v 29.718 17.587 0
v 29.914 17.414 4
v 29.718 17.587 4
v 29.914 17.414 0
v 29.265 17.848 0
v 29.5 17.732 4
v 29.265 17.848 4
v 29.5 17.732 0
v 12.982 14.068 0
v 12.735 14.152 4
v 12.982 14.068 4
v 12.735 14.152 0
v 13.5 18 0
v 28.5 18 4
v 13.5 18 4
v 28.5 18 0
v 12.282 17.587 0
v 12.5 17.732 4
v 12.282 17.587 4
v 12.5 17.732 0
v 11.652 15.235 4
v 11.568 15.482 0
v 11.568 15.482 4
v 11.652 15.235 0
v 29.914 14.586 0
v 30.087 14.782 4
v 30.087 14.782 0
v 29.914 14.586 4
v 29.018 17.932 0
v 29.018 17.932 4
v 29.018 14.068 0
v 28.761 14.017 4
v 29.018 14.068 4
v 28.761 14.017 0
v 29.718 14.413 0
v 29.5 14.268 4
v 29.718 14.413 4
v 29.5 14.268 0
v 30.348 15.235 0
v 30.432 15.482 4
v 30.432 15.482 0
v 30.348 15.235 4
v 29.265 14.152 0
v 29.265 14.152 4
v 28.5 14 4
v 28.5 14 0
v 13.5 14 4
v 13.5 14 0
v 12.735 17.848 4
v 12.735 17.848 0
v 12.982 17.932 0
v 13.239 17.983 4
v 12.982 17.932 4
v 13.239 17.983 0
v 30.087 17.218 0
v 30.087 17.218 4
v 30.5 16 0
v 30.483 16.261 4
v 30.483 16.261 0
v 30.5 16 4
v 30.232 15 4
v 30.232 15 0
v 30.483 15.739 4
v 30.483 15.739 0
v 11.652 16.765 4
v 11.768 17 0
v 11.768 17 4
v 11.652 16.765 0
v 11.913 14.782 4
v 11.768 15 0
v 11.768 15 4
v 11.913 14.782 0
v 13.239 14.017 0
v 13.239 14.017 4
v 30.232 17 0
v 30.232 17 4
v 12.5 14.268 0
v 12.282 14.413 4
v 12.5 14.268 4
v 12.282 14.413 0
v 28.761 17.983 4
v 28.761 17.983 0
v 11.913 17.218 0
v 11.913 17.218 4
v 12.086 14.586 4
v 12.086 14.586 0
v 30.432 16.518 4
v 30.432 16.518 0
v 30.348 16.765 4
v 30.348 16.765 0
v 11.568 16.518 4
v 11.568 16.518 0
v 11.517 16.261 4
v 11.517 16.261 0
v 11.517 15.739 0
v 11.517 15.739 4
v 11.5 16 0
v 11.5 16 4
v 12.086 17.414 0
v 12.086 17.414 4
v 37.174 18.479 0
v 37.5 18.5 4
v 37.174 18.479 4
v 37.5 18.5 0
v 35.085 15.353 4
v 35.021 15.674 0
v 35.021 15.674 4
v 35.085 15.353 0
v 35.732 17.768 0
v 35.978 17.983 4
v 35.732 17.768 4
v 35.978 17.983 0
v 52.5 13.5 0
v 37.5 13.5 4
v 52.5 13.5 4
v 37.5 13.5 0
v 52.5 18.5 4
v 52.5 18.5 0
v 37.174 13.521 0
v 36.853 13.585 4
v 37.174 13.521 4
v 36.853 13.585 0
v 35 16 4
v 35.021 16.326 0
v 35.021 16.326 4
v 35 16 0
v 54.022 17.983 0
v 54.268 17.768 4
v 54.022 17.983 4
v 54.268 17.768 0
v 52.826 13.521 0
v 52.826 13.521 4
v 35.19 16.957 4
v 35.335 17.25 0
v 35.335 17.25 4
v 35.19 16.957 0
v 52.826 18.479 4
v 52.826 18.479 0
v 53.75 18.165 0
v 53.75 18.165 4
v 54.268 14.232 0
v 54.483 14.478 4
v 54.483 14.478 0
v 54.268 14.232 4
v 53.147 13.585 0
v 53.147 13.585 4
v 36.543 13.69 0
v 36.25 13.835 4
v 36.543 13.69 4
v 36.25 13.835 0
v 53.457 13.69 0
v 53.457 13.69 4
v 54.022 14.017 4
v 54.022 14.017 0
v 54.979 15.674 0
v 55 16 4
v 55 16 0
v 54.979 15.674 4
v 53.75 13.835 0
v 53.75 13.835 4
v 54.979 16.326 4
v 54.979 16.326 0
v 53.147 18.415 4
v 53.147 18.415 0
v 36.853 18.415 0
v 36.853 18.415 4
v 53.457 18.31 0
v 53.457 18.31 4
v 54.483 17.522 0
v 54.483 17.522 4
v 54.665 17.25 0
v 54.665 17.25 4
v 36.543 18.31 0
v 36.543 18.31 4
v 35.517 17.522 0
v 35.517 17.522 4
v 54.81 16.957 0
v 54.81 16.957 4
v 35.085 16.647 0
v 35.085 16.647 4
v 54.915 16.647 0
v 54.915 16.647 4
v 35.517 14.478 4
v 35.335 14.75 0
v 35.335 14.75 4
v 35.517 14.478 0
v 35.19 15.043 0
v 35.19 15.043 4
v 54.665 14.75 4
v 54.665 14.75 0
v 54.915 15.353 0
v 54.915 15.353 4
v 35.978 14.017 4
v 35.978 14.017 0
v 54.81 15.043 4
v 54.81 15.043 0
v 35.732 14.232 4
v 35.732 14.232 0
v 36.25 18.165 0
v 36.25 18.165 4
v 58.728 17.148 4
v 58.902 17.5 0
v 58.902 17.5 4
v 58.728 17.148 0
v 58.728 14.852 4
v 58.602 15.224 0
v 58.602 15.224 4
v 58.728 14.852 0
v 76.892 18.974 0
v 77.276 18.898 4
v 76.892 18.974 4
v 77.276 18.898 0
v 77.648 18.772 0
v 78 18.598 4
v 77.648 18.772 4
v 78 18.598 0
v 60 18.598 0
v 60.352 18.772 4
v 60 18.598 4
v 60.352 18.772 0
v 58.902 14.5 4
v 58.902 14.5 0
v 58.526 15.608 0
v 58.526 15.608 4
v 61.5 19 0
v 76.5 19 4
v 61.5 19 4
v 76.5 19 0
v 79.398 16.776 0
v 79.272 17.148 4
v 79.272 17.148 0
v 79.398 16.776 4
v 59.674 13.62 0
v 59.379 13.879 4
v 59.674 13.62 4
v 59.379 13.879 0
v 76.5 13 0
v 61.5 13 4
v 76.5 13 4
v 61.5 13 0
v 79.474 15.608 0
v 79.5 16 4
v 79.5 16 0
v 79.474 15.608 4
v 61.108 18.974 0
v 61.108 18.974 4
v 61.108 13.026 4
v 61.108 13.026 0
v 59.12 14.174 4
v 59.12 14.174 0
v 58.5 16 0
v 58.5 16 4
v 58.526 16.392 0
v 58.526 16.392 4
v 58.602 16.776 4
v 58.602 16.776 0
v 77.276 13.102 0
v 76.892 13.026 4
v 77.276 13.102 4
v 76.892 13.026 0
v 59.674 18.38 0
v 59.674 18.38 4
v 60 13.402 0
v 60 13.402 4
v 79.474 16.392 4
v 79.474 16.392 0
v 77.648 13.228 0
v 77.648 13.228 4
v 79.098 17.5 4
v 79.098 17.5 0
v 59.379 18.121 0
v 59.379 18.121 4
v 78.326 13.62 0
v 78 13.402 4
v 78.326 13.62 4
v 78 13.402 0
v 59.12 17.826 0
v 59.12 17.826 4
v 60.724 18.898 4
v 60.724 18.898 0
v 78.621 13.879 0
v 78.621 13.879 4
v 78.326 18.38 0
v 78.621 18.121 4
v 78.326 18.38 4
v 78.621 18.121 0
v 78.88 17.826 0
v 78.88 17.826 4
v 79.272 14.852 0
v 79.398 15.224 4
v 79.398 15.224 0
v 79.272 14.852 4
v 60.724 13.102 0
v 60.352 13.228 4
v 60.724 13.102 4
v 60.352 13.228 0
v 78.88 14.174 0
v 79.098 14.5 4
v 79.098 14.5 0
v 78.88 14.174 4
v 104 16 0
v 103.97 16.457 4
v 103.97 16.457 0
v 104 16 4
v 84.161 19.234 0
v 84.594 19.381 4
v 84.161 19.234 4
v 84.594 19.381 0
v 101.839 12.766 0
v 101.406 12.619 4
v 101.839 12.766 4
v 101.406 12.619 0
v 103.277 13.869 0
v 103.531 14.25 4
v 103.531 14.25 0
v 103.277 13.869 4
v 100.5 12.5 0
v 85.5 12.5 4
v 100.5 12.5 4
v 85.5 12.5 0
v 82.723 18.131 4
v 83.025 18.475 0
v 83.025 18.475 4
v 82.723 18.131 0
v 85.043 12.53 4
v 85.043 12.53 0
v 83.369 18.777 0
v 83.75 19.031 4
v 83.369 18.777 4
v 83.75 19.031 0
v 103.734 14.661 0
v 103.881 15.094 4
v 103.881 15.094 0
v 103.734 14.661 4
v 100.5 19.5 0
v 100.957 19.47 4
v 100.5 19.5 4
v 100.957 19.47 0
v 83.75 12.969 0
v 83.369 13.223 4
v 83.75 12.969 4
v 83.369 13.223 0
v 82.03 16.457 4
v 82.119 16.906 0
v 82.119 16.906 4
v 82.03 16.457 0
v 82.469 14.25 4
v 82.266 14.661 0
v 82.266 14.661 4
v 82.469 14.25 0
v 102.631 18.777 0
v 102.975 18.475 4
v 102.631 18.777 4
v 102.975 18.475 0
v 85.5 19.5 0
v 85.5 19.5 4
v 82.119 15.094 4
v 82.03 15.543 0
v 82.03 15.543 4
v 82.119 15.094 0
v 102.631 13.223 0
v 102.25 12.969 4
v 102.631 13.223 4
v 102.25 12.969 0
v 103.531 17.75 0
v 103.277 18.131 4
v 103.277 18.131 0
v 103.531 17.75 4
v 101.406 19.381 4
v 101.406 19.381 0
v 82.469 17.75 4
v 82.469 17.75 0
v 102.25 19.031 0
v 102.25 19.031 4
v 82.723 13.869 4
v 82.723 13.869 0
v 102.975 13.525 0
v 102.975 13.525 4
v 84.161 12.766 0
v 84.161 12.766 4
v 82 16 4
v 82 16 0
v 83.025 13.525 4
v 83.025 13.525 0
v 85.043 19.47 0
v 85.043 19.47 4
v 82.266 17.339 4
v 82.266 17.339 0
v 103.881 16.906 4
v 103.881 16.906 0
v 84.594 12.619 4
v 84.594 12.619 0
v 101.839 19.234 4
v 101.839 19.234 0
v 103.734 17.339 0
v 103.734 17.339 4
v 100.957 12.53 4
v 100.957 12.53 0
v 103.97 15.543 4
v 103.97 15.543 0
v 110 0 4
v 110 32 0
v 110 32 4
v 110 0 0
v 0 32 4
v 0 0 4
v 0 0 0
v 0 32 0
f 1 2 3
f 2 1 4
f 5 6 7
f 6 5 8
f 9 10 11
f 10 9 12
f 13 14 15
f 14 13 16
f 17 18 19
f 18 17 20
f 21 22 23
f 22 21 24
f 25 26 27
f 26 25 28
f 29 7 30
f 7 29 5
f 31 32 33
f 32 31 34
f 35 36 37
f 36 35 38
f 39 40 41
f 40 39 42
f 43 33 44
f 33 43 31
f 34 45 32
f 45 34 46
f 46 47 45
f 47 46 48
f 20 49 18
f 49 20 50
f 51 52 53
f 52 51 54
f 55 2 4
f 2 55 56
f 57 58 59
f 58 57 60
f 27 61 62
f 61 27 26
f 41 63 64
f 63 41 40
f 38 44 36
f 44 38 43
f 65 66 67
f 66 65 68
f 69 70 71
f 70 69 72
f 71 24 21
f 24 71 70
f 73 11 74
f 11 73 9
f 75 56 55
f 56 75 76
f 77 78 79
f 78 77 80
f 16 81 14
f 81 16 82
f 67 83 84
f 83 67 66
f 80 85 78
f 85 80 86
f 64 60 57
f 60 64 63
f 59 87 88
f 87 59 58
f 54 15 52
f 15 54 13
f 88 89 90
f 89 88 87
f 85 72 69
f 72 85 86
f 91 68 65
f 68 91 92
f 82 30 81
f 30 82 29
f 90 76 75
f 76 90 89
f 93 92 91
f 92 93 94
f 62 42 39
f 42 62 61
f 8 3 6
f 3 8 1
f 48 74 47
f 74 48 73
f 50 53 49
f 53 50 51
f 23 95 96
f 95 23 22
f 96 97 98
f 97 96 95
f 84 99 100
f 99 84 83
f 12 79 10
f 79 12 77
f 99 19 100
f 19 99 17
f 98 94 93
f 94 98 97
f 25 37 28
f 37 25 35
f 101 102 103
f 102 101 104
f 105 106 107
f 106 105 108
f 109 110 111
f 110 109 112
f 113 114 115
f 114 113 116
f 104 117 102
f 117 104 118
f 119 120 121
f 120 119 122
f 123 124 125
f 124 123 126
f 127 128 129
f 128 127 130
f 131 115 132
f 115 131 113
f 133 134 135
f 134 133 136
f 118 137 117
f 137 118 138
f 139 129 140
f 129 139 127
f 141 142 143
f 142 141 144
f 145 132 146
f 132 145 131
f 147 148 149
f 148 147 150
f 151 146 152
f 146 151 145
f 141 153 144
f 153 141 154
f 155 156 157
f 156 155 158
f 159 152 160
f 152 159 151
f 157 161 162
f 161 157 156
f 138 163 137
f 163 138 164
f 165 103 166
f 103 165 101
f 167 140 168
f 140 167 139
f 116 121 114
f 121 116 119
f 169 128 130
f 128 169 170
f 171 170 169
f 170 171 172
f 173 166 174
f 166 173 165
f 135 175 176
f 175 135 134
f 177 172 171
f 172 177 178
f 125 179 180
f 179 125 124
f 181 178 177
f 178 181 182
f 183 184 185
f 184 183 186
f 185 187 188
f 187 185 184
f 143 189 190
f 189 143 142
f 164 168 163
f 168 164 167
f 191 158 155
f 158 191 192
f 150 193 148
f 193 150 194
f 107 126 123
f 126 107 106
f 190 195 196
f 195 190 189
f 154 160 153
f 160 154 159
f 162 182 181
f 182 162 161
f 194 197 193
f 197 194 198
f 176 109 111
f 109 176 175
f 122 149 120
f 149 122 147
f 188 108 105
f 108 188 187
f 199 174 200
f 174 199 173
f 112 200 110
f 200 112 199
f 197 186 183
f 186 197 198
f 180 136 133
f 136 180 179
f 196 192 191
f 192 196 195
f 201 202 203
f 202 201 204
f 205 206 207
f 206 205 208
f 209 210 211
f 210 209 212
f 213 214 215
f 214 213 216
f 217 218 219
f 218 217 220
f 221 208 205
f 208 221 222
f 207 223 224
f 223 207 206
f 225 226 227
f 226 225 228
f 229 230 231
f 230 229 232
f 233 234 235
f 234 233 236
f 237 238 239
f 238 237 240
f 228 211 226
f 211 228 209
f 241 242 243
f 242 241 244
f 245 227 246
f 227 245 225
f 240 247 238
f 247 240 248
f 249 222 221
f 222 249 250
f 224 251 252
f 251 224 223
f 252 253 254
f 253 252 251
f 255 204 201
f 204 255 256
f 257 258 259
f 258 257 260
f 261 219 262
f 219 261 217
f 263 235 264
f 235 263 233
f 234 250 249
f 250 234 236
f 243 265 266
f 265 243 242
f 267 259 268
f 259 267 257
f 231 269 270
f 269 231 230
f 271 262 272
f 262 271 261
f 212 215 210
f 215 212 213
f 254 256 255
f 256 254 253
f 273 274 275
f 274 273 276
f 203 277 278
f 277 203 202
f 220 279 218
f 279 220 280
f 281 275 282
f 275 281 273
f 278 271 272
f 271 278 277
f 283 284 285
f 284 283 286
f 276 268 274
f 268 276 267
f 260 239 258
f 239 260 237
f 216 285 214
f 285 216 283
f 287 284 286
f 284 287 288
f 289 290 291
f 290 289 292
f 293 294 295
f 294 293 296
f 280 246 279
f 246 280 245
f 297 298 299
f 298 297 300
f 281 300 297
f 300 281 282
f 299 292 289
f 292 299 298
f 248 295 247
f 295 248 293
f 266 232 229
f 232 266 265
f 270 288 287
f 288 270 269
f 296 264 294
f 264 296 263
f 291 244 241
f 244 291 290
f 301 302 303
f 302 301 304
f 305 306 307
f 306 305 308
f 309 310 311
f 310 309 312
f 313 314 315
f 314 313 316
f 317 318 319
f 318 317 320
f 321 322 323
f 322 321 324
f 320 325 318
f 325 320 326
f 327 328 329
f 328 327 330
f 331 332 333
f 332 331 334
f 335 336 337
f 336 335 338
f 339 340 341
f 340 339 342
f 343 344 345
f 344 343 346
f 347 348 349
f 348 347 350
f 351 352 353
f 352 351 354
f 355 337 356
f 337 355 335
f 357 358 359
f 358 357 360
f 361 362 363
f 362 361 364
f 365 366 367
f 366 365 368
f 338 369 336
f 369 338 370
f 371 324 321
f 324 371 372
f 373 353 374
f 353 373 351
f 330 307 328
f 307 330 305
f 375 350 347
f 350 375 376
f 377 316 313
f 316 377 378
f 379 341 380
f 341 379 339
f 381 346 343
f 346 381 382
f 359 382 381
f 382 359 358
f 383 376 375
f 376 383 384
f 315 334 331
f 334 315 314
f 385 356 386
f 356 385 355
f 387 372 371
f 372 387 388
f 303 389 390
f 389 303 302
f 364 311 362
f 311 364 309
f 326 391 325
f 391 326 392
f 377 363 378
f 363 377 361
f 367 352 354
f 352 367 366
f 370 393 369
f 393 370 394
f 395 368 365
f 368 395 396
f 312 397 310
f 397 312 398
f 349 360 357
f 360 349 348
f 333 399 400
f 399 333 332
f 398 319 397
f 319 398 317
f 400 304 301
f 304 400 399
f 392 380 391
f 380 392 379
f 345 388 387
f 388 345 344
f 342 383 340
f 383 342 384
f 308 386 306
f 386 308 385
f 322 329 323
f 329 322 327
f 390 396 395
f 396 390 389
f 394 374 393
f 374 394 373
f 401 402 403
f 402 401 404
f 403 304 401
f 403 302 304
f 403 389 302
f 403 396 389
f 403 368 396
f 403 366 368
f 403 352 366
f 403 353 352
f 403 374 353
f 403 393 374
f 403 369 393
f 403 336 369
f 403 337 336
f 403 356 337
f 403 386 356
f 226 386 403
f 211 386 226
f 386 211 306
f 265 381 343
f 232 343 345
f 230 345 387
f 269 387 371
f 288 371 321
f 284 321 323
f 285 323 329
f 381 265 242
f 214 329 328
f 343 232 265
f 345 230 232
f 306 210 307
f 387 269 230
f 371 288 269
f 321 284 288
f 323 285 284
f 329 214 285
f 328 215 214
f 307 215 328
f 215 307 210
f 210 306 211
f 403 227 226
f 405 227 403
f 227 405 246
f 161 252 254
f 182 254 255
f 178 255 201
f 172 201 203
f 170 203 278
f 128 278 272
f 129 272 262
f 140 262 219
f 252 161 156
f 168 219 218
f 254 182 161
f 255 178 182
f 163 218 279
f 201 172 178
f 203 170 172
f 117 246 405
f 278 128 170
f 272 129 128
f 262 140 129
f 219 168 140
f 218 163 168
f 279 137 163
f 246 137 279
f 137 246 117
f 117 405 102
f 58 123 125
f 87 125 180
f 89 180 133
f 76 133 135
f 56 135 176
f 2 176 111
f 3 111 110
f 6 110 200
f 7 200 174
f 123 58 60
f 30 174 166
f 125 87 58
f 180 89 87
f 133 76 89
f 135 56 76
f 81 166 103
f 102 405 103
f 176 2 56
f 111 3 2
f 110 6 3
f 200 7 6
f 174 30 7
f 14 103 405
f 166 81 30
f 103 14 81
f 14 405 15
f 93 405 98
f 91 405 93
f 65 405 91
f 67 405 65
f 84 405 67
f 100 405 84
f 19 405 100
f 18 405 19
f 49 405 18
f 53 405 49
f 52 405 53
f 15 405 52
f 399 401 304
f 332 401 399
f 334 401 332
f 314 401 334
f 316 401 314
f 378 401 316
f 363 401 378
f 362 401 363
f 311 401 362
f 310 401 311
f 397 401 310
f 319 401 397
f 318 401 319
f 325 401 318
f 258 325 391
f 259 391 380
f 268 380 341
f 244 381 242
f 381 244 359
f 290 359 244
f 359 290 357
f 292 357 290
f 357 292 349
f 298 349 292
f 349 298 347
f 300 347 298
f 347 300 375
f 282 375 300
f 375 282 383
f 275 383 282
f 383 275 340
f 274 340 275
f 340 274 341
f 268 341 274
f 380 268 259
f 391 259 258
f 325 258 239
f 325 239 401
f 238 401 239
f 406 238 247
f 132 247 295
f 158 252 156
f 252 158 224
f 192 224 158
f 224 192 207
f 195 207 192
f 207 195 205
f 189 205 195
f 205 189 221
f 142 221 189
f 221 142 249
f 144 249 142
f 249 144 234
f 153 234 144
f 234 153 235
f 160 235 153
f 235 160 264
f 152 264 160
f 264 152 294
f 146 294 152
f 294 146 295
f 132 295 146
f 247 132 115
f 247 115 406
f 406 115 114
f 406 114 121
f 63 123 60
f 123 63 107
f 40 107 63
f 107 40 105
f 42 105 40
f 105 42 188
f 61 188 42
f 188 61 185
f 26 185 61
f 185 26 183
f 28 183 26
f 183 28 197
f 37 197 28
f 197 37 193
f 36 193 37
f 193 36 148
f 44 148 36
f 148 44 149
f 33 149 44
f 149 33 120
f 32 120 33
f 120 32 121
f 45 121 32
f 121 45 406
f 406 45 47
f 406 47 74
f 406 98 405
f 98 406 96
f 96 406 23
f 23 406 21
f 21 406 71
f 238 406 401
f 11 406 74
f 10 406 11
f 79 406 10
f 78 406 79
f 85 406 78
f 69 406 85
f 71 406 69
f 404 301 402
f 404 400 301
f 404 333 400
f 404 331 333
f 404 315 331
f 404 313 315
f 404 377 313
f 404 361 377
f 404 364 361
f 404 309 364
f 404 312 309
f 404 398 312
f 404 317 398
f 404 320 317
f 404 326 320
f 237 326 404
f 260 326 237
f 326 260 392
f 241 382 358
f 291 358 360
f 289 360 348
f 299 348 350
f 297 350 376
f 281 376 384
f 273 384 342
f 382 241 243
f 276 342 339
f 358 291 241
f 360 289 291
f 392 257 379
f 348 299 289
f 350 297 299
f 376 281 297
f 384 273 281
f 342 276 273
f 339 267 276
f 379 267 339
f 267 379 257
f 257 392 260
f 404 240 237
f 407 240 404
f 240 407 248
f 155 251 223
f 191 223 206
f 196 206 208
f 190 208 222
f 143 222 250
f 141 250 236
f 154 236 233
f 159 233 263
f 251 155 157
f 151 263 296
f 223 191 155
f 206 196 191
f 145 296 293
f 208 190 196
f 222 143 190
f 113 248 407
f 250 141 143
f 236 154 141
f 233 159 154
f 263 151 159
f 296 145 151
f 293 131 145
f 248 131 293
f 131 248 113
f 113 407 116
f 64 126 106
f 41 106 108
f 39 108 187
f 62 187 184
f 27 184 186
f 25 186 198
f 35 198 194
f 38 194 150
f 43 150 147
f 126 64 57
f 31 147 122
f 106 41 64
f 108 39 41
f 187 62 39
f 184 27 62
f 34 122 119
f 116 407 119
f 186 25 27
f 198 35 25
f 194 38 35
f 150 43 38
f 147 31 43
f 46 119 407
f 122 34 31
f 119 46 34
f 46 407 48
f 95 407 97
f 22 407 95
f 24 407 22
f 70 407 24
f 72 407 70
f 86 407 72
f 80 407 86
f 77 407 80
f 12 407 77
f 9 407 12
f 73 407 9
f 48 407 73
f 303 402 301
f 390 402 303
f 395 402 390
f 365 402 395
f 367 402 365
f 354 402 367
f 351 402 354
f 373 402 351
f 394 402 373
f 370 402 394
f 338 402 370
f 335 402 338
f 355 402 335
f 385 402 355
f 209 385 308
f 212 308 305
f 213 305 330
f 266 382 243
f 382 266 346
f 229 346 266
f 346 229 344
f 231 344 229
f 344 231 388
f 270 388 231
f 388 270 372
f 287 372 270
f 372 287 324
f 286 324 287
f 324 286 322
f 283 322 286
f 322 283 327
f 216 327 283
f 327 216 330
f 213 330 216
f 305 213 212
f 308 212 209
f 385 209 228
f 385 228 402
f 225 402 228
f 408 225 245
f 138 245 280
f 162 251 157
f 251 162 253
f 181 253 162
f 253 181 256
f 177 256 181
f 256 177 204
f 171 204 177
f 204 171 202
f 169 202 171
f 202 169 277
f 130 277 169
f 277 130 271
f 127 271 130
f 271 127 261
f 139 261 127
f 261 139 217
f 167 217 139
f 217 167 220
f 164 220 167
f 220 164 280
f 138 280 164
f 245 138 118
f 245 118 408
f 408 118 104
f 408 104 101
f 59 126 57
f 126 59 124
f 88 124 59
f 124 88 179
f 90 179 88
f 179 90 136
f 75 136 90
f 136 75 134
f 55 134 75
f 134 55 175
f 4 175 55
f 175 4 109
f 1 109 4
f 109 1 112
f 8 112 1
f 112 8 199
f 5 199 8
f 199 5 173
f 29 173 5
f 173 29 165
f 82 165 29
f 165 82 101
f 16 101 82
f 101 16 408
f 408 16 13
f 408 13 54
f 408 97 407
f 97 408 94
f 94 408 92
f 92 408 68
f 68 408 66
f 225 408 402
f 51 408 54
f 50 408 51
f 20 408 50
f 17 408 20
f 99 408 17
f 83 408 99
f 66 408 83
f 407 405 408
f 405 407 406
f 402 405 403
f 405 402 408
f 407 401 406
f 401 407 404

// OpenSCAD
$fn = 48;

plate_length = 110;
plate_width = 32;
plate_thickness = 4;
slot_lengths = [18, 18, 18, 18];
slot_widths = [4, 5, 6, 7];
slot_radius = 1.5;
margin_x = 12;
slot_spacing = 24;

module rounded_slot(length, width, height) {
    hull() {
        translate([slot_radius, width / 2, 0])
            cylinder(h = height, r = width / 2);
        translate([length - slot_radius, width / 2, 0])
            cylinder(h = height, r = width / 2);
    }
}

difference() {
    cube([plate_length, plate_width, plate_thickness]);

    for (i = [0 : len(slot_widths) - 1]) {
        x = margin_x + i * slot_spacing;
        translate([x, (plate_width - slot_widths[i]) / 2, -0.1])
            rounded_slot(slot_lengths[i], slot_widths[i], plate_thickness + 0.2);
    }
}
